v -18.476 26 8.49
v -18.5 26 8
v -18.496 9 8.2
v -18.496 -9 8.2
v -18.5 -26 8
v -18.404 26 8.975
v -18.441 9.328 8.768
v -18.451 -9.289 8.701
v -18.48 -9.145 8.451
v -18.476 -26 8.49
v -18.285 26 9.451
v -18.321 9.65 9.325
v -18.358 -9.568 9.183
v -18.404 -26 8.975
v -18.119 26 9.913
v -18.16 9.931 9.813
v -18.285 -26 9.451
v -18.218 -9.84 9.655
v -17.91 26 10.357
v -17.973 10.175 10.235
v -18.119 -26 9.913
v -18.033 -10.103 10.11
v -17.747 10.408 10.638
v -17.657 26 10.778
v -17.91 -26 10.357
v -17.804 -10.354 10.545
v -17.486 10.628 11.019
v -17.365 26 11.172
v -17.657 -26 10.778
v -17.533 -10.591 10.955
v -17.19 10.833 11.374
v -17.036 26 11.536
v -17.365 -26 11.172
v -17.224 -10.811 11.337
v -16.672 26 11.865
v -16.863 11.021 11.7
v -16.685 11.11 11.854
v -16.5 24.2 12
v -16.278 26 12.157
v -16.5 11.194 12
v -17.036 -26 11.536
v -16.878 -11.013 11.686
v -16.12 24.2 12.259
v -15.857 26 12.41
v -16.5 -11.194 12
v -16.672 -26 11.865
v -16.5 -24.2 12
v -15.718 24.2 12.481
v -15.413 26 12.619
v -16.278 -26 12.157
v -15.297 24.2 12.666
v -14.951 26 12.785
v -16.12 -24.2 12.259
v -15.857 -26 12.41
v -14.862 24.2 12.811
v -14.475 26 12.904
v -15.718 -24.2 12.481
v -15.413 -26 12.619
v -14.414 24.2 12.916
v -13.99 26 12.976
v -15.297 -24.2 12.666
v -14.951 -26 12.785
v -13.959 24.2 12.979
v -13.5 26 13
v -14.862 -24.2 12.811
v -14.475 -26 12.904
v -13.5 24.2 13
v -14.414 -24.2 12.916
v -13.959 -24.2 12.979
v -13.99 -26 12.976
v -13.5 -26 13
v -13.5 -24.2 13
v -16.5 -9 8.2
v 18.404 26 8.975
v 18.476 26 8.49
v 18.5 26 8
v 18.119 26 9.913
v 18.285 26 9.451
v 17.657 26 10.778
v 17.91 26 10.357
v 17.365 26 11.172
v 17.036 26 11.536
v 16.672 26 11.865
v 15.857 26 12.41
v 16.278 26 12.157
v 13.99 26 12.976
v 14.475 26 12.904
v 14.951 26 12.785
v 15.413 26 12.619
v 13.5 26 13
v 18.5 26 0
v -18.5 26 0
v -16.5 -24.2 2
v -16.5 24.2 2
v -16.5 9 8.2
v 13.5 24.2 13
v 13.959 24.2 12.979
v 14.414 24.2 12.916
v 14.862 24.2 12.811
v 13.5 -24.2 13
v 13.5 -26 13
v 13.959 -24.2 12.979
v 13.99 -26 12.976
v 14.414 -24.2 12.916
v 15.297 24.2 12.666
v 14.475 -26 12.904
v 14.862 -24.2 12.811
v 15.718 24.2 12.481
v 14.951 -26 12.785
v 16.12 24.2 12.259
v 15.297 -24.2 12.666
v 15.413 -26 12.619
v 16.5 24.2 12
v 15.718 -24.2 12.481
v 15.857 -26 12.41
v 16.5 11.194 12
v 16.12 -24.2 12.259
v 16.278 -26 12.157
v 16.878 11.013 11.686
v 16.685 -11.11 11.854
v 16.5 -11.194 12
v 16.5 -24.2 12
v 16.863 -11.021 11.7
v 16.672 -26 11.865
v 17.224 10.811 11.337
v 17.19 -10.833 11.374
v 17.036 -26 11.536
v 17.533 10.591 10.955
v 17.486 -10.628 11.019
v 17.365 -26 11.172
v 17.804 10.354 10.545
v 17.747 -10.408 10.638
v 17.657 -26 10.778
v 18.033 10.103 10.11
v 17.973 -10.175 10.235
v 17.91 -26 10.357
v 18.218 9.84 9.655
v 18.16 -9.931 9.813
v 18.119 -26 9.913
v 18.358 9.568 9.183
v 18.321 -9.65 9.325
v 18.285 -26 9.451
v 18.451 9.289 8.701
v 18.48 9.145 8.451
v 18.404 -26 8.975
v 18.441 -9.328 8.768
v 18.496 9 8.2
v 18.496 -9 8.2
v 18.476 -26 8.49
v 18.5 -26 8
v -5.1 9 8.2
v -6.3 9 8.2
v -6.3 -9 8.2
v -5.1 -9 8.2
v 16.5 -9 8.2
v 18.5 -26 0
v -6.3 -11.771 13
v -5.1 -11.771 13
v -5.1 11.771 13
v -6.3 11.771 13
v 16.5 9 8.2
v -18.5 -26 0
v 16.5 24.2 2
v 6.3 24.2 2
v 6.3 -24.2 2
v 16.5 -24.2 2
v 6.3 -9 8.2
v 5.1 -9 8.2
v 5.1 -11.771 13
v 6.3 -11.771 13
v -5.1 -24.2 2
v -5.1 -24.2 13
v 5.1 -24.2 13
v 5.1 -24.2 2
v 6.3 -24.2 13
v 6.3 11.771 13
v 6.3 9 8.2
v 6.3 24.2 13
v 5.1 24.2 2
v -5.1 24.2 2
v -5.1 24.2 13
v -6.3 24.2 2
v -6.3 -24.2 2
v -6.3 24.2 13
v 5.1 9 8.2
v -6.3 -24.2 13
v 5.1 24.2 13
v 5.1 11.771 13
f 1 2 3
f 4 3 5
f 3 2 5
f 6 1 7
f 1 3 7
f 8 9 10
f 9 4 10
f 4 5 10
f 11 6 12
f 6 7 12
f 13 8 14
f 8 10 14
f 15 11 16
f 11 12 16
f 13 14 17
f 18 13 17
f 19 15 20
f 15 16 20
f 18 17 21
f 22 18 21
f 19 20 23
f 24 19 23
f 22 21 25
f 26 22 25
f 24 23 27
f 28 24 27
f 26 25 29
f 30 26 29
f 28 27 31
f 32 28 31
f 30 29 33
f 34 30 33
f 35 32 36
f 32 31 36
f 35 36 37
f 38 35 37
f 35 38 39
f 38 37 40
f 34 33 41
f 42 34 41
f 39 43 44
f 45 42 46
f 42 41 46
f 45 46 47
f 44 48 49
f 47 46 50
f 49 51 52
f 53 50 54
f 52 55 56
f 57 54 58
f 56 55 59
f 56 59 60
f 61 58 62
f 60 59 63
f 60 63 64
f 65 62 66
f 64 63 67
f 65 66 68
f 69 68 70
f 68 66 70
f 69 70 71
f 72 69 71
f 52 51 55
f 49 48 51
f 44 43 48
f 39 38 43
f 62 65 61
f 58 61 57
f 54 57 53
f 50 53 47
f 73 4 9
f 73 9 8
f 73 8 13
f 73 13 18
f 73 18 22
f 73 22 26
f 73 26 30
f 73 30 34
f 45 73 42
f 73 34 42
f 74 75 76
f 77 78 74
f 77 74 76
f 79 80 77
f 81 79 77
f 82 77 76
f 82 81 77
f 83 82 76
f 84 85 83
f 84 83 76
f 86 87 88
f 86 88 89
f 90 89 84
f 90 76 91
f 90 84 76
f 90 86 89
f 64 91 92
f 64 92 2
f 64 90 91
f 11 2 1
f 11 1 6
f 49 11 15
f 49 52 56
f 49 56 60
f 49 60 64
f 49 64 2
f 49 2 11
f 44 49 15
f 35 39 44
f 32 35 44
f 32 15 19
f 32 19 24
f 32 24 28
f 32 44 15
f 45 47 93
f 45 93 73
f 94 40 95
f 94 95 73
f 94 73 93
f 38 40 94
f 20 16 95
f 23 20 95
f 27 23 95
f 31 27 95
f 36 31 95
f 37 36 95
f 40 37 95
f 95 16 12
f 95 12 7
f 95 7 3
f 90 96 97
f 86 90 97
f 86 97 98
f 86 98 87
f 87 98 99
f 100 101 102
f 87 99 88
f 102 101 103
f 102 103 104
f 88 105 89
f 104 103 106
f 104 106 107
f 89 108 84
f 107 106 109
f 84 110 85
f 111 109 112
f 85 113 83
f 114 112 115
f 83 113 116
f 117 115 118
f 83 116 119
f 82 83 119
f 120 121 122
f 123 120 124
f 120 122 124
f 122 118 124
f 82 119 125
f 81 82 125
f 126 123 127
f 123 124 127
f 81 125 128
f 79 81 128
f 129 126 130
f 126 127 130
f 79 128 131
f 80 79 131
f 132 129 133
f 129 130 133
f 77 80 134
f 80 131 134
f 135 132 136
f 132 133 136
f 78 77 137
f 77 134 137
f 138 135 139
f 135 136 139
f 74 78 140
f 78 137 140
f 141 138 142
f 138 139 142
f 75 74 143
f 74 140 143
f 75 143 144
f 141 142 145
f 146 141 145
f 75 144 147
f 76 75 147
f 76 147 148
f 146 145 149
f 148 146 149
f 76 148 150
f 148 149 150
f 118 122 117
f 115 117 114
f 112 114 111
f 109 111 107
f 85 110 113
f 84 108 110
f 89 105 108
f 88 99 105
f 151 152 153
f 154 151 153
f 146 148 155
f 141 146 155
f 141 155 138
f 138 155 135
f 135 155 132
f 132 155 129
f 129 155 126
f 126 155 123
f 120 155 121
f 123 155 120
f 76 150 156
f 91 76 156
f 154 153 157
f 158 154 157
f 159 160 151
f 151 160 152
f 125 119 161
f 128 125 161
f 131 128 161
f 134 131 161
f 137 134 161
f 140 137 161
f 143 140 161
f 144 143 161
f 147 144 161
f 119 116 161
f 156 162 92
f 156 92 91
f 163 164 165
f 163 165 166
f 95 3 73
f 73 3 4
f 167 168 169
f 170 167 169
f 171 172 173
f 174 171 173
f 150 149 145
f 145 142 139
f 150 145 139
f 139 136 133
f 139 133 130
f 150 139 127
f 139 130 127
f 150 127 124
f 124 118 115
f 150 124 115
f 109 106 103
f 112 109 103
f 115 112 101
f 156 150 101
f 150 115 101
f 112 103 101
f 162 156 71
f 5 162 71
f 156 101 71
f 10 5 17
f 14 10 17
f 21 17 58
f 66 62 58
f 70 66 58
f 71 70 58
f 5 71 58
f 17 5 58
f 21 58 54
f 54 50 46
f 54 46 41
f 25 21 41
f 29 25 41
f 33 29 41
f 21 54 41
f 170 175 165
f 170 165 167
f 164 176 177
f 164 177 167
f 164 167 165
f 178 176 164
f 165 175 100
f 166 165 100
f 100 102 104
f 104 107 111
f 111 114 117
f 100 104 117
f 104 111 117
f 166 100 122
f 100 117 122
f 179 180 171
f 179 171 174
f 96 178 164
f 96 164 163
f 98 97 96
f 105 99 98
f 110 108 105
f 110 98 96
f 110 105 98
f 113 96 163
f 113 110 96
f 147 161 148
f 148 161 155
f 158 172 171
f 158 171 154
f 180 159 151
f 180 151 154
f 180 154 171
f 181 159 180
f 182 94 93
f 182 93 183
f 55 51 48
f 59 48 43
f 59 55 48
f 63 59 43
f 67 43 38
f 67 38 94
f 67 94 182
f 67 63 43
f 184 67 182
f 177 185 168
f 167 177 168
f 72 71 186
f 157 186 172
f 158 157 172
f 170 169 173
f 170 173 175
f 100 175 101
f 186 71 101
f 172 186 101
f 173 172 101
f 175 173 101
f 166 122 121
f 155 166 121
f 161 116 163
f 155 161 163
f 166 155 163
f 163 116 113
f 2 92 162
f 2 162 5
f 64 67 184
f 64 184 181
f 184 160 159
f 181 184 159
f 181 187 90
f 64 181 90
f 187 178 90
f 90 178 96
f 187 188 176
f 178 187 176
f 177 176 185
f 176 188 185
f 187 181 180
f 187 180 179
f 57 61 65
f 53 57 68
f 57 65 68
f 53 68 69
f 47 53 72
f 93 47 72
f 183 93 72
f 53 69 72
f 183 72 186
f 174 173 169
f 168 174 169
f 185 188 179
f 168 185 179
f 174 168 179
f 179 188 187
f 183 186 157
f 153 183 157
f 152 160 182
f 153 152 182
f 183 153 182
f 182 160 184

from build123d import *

# Parameters (mm, degrees)
SKETCH1_W               = 37
SKETCH1_H               = 52
BOSS_EXTRUDE1_DEPTH     = 2
BOSS_EXTRUDE2_DEPTH     = 52
SKETCH3_W               = 10.2
SKETCH3_H               = 48.4
CUT_EXTRUDE1_DEPTH      = 11
CUT_EXTRUDE2_DEPTH      = 35.456494308
CUT_EXTRUDE2_DEPTH_BACK = 35.456494308


with BuildPart() as part:
    # Sketch1 → Boss-Extrude1 (new body)
    with BuildSketch(Plane.XY):
        Rectangle(SKETCH1_W, SKETCH1_H)
    extrude(amount=BOSS_EXTRUDE1_DEPTH)

    # Sketch2 → Boss-Extrude2 (add)
    with BuildSketch(Plane.XZ.offset(26)):
        with BuildLine():
            Line((-13.5, 13), (13.5, 13))
            ThreePointArc((13.5, 13), (17.035533906, 11.535533906), (18.5, 8))
            Line((18.5, 8), (18.5, 2))
            Line((18.5, 2), (-18.5, 2))
            Line((-18.5, 2), (-18.5, 8))
            ThreePointArc((-18.5, 8), (-17.035533906, 11.535533906), (-13.5, 13))
        make_face()
    extrude(amount=-BOSS_EXTRUDE2_DEPTH)

    # Sketch3 → Cut-Extrude1 (cut)
    with BuildSketch(Plane.XY.offset(13)):
        Rectangle(SKETCH3_W, SKETCH3_H)
        with Locations((11.4, 0)):
            Rectangle(SKETCH3_W, SKETCH3_H)
        with Locations((-11.4, 0)):
            Rectangle(SKETCH3_W, SKETCH3_H)
    extrude(amount=-CUT_EXTRUDE1_DEPTH, mode=Mode.SUBTRACT)

    # Sketch4 → Cut-Extrude2 (cut, two sides: drawn at the far end of the back side and taken through both)
    with BuildSketch(Plane(origin=(0, 0, 0), x_dir=(0, 0, -1), z_dir=(1, 0, 0)).offset(-CUT_EXTRUDE2_DEPTH_BACK)):
        Polygon((-18, -14.658032638), (-18, 14.658032638), (-8.2, 9), (-8.2, -9), align=None)
    extrude(amount=CUT_EXTRUDE2_DEPTH + CUT_EXTRUDE2_DEPTH_BACK, mode=Mode.SUBTRACT)


solid = part.part
